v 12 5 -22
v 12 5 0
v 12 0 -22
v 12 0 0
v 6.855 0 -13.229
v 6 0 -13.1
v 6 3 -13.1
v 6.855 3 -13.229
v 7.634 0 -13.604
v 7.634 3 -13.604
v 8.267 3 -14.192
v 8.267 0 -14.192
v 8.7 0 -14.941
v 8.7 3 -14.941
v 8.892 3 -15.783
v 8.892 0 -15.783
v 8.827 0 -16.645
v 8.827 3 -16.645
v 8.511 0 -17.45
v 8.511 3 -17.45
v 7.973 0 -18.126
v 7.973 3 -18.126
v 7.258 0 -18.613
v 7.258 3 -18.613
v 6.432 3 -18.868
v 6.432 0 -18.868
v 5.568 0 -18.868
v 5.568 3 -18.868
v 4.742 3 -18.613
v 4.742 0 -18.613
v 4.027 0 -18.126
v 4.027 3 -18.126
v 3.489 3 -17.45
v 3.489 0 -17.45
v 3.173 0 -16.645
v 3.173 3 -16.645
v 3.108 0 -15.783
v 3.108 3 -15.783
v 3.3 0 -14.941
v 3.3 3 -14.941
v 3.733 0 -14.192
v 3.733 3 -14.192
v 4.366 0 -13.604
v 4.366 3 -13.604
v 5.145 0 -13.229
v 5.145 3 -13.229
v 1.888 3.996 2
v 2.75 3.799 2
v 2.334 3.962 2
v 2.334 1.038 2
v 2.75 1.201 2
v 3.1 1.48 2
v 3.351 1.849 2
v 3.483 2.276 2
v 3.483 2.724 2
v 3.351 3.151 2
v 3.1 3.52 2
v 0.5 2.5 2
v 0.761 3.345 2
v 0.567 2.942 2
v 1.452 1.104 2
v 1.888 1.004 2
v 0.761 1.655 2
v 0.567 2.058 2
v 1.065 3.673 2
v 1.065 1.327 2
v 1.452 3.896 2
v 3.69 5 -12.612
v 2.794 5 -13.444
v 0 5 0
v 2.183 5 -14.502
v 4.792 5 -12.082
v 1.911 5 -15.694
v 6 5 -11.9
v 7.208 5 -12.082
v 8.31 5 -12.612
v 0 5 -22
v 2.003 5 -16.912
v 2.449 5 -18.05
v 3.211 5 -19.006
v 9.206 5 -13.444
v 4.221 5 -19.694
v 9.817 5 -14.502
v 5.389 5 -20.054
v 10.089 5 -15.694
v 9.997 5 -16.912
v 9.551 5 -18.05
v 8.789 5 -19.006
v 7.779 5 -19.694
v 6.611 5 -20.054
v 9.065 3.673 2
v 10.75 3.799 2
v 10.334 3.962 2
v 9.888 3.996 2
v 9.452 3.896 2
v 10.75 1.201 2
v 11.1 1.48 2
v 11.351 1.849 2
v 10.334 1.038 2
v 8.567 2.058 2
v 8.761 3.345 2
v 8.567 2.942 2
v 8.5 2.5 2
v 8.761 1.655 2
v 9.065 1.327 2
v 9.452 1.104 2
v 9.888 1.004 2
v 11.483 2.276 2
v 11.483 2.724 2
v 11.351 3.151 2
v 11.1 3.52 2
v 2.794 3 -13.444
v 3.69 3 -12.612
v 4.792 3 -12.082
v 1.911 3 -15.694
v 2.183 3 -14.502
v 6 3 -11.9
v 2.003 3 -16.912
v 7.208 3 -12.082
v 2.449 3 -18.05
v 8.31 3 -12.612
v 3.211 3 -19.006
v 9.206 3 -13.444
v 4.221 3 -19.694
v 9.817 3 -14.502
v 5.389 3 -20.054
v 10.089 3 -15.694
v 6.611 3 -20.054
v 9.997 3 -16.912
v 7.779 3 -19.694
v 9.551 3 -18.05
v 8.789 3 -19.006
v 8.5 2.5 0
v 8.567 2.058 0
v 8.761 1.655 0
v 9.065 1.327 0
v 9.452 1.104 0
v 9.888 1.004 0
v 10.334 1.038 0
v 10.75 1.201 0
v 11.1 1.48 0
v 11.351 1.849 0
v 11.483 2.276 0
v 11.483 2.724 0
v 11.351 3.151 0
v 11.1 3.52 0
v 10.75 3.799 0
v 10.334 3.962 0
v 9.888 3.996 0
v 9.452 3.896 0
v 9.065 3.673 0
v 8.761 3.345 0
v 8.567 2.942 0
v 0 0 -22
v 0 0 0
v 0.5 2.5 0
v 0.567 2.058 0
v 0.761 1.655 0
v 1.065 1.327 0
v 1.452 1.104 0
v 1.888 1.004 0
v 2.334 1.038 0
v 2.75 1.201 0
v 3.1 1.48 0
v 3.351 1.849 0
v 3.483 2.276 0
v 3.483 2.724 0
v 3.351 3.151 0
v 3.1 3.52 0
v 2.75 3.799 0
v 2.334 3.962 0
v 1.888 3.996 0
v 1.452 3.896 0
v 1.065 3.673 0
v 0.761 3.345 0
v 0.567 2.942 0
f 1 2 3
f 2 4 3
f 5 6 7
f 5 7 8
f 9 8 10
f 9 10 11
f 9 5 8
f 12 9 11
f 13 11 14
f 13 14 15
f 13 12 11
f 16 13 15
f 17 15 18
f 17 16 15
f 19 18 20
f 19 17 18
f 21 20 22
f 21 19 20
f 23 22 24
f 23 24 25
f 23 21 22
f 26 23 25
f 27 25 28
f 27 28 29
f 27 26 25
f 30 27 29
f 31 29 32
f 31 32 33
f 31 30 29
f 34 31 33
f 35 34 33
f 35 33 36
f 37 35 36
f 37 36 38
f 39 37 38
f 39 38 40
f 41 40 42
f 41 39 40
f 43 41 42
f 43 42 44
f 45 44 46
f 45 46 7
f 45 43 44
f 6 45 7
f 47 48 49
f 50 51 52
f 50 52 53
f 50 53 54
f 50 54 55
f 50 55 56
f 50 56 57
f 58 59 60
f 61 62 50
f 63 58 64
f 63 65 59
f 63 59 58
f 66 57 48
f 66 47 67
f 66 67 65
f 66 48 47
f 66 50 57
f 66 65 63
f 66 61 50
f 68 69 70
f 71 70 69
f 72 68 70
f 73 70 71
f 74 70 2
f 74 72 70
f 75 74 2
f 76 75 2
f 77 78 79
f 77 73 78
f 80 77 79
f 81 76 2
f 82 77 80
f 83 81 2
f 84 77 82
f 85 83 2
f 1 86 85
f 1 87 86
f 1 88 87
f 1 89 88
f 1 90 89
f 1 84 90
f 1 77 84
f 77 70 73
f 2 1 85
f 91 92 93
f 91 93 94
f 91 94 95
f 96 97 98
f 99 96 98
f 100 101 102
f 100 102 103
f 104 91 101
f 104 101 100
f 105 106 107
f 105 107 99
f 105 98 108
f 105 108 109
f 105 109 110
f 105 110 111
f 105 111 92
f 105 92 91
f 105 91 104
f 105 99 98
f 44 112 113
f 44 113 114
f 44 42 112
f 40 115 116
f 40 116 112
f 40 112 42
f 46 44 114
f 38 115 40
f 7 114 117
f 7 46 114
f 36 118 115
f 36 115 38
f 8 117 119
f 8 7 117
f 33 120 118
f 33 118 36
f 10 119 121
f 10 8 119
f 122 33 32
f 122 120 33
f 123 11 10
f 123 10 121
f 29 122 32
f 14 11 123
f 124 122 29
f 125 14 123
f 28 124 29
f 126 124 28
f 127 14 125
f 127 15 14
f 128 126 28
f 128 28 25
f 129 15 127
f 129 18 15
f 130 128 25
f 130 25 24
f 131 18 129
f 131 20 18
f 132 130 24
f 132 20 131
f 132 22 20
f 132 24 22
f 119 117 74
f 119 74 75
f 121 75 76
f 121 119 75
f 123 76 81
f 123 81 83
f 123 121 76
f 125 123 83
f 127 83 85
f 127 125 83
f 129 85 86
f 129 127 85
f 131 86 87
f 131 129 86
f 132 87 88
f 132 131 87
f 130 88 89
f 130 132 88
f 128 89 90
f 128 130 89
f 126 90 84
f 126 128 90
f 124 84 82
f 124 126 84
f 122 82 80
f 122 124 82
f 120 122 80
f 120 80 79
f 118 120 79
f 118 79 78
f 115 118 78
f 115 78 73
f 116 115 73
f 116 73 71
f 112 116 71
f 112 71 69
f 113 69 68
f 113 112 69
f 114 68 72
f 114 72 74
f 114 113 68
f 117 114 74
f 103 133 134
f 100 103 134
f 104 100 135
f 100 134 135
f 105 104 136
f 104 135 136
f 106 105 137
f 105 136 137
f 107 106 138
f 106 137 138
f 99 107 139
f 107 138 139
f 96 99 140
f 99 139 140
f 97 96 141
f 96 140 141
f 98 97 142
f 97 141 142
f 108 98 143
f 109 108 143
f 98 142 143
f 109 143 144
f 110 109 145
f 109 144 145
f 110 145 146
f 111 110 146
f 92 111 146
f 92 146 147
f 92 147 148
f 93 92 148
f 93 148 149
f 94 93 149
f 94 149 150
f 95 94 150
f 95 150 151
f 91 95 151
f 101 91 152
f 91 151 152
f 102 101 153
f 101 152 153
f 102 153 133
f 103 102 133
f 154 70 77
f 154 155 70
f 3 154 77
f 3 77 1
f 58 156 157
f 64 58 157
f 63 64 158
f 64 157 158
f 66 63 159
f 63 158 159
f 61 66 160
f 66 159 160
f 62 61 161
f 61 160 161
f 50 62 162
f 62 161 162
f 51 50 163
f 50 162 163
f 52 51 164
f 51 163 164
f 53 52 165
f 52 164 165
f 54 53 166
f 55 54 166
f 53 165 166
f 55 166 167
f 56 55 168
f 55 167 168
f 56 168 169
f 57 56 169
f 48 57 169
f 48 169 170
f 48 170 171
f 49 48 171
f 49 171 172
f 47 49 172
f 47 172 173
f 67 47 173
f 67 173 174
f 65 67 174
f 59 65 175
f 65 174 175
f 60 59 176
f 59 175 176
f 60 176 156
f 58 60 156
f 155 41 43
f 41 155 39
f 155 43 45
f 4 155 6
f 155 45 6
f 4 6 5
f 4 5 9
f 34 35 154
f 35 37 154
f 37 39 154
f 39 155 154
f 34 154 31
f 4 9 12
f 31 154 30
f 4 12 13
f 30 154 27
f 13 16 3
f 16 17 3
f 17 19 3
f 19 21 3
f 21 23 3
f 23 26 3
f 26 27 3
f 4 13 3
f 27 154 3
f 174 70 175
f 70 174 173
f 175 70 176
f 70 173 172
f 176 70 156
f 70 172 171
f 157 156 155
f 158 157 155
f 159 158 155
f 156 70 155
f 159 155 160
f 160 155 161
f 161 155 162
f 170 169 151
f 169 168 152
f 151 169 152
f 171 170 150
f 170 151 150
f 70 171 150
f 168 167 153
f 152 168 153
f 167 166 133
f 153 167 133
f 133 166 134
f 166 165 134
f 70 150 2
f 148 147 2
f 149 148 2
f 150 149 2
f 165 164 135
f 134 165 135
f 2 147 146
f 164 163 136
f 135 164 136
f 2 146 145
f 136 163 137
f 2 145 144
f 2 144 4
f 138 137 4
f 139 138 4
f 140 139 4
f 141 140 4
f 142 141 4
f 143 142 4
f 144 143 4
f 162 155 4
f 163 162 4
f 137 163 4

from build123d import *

# Parameters (mm, degrees)
SKETCH_1_W      = 12
SKETCH_1_H      = 22
SKETCH_1_R      = 2.9
EXTRUDE_1_DEPTH = 3
SKETCH_3_W      = 12
SKETCH_3_H      = 22
SKETCH_3_R      = 4.1
EXTRUDE_2_DEPTH = 2
SKETCH_7_R      = 1.5
EXTRUDE_3_DEPTH = 2


with BuildPart() as part:
    # 草图1 → 凸台-拉伸1 (new body)
    with BuildSketch(Plane(origin=(0, 0, 0), x_dir=(1, 0, 0), z_dir=(0, 1, 0))):
        with Locations((6, 11)):
            Rectangle(SKETCH_1_W, SKETCH_1_H)
        with Locations(Location((6, 16, 0), (0, 0, 270))):
            Circle(SKETCH_1_R, mode=Mode.SUBTRACT)
    extrude(amount=EXTRUDE_1_DEPTH)

    # 草图3 → 凸台-拉伸2 (add)
    with BuildSketch(Plane(origin=(0, 3, 0), x_dir=(1, 0, 0), z_dir=(0, 1, 0))):
        with Locations((6, 11)):
            Rectangle(SKETCH_3_W, SKETCH_3_H)
        with Locations(Location((6, 16, 0), (0, 0, 270))):
            Circle(SKETCH_3_R, mode=Mode.SUBTRACT)
    extrude(amount=EXTRUDE_2_DEPTH)

    # 草图7 → 凸台-拉伸3 (add)
    with BuildSketch(Plane.XY):
        with Locations(Location((2, 2.5, 0), (0, 0, 180))):
            Circle(SKETCH_7_R)
        with Locations(Location((10, 2.5, 0), (0, 0, 180))):
            Circle(SKETCH_7_R)
    extrude(amount=EXTRUDE_3_DEPTH)


solid = part.part
